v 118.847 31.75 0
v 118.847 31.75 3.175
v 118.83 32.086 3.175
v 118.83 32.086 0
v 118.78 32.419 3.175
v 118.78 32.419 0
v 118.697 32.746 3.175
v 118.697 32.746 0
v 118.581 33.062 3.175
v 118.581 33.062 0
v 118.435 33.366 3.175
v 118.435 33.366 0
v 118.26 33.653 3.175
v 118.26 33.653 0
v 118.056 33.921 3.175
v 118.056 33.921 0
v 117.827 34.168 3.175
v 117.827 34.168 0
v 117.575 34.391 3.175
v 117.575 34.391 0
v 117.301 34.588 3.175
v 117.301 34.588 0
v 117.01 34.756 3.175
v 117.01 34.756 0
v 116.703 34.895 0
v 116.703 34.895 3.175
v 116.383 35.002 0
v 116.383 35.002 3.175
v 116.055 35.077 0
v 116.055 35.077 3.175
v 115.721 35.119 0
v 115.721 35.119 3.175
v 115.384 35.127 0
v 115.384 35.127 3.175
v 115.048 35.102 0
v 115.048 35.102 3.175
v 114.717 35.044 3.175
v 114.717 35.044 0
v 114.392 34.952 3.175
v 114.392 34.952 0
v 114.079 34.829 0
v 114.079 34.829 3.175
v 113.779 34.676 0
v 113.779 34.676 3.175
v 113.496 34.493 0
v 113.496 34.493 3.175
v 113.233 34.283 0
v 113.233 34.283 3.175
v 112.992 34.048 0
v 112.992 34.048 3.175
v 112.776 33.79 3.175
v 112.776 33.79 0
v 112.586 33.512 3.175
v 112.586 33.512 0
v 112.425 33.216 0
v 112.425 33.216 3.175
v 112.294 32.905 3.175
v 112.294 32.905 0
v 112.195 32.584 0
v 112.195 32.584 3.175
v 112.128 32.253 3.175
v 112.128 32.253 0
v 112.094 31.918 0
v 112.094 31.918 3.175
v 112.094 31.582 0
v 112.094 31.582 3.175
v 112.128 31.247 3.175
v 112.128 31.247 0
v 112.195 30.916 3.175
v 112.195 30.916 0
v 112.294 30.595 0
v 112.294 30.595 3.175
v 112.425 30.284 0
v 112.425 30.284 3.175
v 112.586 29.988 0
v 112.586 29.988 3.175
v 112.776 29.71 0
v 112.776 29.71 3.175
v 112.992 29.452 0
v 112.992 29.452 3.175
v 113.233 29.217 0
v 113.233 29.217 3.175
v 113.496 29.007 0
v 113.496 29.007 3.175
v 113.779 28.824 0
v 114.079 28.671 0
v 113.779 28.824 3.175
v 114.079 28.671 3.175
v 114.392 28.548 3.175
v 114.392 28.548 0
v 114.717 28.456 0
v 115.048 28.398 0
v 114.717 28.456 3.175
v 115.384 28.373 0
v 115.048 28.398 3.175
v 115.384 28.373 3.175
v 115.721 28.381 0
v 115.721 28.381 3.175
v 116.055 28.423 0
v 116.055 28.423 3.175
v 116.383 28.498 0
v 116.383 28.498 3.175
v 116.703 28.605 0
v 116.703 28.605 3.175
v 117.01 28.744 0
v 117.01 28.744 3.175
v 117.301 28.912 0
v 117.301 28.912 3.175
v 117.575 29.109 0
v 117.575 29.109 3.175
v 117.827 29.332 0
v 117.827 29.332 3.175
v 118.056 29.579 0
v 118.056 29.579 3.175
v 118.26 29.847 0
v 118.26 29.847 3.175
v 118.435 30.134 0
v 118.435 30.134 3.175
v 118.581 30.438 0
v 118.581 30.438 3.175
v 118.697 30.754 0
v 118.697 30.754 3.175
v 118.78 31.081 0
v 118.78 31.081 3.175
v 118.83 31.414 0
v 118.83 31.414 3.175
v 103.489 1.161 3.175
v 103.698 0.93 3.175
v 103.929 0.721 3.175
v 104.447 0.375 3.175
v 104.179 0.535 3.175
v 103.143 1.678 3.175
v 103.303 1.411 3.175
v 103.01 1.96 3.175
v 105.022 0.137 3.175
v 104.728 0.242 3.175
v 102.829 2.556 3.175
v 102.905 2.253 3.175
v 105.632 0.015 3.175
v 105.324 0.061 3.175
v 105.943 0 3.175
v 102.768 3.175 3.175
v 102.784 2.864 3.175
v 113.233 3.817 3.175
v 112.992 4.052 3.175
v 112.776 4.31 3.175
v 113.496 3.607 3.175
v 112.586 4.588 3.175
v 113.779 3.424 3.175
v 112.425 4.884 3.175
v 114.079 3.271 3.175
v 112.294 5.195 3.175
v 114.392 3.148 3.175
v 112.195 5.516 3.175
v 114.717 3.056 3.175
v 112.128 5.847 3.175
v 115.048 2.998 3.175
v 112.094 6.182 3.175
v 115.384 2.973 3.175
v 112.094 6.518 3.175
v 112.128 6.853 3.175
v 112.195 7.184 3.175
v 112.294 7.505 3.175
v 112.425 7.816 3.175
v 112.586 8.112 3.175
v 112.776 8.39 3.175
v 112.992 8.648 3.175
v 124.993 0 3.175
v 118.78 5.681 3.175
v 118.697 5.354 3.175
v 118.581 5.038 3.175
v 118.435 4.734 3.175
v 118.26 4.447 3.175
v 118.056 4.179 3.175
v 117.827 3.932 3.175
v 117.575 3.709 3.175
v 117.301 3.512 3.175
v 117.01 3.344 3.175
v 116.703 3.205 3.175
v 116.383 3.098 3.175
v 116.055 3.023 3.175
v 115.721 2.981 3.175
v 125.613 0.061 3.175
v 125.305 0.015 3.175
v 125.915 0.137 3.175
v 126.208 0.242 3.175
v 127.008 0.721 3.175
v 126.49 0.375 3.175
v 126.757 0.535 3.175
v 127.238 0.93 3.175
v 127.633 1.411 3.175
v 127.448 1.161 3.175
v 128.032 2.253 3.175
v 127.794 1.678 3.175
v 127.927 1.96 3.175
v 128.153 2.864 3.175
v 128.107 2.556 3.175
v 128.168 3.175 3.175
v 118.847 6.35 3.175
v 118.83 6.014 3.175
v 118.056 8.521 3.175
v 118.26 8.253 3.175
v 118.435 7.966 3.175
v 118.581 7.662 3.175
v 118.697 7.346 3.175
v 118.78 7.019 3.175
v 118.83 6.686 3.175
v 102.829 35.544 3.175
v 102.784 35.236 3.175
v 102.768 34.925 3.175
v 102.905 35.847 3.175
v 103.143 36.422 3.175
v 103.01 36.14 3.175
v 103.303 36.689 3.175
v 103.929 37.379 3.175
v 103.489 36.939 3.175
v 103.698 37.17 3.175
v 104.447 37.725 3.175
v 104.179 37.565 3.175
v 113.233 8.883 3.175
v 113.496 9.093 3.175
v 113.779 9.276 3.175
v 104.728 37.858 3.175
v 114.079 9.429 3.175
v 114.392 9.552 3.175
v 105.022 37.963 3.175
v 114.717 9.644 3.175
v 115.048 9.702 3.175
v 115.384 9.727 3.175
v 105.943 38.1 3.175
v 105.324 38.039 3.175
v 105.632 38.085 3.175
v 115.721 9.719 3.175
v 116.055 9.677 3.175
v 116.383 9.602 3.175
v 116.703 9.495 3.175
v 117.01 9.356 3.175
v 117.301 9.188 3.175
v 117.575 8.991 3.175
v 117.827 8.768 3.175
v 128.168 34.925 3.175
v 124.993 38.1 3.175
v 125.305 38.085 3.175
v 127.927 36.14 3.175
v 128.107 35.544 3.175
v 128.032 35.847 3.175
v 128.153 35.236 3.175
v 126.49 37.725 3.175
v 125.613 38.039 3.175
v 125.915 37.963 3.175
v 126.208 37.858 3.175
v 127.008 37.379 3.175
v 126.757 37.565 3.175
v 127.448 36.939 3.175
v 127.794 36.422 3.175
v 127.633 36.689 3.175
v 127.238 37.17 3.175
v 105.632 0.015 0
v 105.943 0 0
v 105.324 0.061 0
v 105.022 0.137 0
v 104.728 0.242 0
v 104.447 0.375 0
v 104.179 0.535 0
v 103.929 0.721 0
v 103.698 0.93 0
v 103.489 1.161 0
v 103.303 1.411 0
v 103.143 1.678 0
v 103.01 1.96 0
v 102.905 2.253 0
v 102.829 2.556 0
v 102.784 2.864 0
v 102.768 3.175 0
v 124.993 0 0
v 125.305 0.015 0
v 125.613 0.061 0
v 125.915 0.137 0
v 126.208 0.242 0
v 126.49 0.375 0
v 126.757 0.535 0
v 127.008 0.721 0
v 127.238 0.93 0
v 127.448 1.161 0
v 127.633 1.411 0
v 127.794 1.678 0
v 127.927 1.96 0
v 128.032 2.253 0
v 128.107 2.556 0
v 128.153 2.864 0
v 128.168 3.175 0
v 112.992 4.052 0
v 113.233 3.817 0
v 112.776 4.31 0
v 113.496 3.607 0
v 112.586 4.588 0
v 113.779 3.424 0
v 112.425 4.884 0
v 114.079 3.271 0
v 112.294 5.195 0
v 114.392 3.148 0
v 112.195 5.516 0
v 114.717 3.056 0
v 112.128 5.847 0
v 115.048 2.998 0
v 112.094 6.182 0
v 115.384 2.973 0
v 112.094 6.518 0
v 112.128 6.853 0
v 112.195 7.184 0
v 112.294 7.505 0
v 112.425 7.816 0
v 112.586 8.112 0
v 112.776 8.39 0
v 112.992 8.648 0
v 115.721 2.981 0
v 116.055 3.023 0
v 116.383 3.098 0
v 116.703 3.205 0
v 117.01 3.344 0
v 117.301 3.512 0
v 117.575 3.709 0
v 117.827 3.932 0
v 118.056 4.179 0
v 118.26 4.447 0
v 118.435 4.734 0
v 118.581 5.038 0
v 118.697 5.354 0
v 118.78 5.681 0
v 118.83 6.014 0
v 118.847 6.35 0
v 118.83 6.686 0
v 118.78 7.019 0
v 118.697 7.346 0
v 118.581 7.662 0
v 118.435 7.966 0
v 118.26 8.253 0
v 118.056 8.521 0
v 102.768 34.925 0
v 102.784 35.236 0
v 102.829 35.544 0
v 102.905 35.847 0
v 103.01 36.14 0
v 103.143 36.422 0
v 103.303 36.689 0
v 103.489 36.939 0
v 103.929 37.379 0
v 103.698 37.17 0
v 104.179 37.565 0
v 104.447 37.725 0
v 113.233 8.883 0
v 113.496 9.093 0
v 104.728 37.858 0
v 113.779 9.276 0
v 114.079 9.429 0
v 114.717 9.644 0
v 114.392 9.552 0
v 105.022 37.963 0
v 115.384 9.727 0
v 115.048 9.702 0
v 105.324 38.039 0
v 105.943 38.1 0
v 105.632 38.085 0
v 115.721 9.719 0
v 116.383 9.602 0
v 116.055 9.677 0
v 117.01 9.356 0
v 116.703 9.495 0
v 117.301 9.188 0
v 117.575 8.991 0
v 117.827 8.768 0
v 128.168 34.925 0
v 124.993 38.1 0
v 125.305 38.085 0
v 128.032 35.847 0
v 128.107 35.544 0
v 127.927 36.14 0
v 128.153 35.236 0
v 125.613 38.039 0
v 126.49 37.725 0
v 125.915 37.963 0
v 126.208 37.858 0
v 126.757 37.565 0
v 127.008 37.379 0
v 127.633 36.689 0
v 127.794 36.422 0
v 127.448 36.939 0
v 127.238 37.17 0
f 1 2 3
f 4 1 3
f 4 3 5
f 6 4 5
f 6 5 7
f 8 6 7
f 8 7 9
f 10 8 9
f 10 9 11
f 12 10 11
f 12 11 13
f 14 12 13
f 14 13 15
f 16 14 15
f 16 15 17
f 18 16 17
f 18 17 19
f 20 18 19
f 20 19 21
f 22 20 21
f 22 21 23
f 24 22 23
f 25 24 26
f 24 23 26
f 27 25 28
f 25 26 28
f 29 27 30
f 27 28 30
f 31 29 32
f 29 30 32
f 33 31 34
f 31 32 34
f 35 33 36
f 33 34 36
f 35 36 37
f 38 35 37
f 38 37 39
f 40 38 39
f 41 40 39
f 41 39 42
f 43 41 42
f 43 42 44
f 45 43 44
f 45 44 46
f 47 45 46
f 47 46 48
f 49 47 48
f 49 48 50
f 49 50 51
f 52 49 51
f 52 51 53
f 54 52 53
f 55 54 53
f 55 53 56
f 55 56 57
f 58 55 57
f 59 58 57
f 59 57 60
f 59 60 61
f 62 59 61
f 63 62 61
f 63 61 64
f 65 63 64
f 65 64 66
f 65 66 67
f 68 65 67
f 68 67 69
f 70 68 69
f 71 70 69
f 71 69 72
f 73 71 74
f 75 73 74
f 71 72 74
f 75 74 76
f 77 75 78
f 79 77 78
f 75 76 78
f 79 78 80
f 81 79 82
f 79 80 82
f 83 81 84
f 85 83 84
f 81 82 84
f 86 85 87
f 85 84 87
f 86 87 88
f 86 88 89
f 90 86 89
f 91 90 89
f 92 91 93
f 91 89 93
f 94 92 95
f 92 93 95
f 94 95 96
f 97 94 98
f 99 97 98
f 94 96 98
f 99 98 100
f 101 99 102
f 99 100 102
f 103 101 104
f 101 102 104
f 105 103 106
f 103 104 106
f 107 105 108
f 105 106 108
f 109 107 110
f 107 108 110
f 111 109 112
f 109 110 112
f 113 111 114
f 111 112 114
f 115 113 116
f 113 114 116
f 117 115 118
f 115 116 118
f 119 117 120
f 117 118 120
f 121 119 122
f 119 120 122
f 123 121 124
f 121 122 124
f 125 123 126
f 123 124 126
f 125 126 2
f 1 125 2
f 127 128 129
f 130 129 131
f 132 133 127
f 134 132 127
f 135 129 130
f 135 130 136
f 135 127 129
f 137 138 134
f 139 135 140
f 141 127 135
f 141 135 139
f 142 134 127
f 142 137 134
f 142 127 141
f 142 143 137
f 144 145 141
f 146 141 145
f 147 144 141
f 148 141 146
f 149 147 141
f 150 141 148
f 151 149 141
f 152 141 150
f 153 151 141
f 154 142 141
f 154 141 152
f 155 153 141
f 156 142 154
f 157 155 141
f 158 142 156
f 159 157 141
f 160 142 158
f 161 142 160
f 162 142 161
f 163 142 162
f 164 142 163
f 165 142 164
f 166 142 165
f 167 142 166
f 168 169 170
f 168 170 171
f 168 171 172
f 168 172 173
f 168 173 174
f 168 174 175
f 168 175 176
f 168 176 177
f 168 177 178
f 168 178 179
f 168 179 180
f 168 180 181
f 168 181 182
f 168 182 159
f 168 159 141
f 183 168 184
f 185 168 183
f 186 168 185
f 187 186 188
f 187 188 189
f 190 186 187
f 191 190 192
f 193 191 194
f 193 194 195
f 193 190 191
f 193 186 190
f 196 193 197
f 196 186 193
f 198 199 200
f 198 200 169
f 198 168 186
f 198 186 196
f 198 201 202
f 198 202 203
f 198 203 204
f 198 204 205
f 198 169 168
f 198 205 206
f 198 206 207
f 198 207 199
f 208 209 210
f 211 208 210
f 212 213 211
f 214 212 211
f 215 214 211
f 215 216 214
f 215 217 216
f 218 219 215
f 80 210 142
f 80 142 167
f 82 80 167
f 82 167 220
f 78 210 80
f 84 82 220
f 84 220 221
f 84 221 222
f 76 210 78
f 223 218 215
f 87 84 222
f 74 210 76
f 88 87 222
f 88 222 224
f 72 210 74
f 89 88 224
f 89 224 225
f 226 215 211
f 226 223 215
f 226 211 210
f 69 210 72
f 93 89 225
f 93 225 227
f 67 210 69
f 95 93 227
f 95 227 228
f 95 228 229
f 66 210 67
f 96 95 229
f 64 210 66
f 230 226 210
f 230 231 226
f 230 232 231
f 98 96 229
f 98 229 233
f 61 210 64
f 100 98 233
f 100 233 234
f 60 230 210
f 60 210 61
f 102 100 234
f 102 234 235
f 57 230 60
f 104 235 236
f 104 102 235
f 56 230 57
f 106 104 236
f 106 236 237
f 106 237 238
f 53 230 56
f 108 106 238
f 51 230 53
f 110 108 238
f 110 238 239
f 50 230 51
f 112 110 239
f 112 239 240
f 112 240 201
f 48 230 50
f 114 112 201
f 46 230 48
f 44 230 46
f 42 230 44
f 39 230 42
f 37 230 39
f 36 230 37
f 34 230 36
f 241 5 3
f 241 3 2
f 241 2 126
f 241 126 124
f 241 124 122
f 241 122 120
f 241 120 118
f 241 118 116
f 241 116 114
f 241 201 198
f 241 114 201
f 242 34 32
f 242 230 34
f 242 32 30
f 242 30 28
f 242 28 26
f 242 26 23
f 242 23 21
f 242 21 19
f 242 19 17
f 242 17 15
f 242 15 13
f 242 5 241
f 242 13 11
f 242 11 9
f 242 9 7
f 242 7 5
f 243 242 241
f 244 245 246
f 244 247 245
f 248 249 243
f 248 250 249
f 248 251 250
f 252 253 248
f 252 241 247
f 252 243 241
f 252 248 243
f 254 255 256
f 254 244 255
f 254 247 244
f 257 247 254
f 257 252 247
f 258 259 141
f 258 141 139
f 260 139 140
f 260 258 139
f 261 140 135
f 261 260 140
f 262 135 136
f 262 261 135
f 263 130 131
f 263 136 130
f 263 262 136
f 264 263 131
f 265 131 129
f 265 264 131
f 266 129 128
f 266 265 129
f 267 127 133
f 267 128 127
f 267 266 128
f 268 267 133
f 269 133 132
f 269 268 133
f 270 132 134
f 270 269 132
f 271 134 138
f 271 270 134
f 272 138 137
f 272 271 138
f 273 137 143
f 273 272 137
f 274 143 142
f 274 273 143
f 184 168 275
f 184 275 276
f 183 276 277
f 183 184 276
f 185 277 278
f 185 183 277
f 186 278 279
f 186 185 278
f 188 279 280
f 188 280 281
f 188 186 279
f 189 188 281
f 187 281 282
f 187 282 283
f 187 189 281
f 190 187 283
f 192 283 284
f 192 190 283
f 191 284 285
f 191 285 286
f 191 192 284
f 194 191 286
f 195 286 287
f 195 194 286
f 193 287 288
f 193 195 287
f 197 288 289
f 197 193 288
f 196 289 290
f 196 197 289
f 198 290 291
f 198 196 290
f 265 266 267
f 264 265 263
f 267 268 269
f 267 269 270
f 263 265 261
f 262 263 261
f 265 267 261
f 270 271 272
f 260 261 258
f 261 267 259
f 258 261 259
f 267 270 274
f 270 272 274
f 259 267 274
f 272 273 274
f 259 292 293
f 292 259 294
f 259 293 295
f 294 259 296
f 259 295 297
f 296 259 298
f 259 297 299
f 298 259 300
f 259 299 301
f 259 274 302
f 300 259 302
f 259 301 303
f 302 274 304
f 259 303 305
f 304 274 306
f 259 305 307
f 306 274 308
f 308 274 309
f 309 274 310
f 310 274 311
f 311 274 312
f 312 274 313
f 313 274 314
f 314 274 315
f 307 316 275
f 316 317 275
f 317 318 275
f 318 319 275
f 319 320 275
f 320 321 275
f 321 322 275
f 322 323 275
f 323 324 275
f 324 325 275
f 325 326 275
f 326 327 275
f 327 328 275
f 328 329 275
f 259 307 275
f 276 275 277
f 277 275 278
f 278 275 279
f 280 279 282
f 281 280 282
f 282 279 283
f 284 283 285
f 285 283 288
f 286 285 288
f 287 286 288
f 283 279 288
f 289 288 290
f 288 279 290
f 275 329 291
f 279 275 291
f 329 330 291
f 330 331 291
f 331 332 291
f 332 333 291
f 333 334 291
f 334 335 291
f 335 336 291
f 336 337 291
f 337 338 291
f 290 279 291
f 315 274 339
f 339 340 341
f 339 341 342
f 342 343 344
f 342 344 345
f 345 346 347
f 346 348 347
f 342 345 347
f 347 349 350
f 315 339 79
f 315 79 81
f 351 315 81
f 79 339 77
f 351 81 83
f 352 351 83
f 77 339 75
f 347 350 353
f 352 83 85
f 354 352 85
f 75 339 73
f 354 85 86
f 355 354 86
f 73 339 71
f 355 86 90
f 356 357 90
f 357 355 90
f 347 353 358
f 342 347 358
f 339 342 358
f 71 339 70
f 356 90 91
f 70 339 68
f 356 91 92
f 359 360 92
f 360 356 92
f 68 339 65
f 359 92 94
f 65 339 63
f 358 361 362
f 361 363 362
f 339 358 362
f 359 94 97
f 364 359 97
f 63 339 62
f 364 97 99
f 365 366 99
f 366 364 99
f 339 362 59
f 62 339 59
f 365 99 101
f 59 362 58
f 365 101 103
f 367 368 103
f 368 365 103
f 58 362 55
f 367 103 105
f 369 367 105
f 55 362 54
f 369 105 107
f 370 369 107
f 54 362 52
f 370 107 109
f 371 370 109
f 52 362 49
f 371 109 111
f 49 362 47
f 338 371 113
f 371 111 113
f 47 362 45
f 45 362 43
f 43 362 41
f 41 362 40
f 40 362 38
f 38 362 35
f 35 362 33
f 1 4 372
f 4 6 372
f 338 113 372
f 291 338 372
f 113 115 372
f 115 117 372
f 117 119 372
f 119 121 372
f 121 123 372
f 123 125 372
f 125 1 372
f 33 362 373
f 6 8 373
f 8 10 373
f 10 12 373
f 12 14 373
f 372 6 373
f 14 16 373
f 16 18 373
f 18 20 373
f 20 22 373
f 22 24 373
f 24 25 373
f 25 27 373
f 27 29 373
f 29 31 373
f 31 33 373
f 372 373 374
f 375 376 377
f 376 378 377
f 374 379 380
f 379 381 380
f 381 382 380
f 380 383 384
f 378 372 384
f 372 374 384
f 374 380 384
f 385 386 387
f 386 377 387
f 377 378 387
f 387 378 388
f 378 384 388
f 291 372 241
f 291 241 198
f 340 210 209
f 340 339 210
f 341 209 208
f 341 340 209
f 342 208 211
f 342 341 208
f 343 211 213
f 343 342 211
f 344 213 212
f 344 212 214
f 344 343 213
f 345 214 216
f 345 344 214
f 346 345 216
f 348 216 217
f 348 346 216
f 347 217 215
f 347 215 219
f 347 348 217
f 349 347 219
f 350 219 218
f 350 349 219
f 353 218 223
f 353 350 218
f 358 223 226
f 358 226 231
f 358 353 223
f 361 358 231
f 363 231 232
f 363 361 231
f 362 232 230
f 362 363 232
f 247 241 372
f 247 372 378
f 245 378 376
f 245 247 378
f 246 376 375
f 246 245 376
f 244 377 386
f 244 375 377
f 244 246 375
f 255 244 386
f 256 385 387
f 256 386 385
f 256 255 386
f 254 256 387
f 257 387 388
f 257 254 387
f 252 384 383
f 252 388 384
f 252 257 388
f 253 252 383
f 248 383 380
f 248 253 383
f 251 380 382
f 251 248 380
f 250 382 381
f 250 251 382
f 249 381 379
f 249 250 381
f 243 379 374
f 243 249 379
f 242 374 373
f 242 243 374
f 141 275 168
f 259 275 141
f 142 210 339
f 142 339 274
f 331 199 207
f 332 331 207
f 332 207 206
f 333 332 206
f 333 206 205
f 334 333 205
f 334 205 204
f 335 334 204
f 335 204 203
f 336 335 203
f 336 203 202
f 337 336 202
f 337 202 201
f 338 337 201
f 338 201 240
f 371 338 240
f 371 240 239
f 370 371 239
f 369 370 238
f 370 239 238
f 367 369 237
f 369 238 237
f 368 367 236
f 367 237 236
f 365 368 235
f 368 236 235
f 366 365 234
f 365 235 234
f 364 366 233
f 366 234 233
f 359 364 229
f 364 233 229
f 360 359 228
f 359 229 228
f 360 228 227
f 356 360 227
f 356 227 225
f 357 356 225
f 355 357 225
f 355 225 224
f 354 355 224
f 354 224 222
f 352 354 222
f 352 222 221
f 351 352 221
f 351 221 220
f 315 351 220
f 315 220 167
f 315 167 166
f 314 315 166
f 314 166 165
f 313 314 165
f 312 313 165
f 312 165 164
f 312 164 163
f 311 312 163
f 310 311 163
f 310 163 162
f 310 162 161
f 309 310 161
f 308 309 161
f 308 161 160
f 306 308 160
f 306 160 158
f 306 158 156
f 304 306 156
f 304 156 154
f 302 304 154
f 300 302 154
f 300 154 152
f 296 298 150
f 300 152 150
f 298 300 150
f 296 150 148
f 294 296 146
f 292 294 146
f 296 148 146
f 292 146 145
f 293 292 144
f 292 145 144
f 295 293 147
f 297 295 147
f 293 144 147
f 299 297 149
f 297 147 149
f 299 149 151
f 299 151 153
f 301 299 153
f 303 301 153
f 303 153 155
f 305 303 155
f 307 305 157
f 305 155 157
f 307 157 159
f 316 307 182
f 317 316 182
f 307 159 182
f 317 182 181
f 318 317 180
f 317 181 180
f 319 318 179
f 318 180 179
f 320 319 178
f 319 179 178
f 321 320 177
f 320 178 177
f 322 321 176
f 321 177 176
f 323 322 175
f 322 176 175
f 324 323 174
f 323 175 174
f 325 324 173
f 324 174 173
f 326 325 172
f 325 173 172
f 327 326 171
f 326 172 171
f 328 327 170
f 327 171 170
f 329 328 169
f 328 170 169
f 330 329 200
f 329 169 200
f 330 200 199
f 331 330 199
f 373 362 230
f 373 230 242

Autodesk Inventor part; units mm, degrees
ref_plane "YZ Plane" through (0, 0, 0) normal (1, 0, 0) x (0, 1, 0)
ref_plane "XZ Plane" through (0, 0, 0) normal (0, 1, 0) x (-1, 0, 0)
ref_plane "XY Plane" through (0, 0, 0) normal (0, 0, 1) x (1, 0, 0)
sketch "Sketch1" plane through (0, 0, 0) normal (0, 0, 1) x (1, 0, 0)
  line L0 (0, 0) -> (0, 38.1)
  line L1 (0, 38.1) -> (128.1684, 38.1)
  line L2 (128.1684, 38.1) -> (128.1684, 0)
  line L3 (128.1684, 0) -> (0, 0)
  dimension "d0" = 38.1
  dimension "d1" = 128.1684
extrude "Extrusion1" add sketch "Sketch1" along normal blind 3.175
sketch "Sketch2" plane through (0, 0, 3.175) normal (0, 0, 1) x (1, 0, 0)
  line L0 (128.1684, 38.1) -> (0, 38.1) projected
  line L1 (0, 38.1) -> (12.7, 38.1)
  line L2 (12.7, 38.1) -> (12.7, 31.75)
  line L3 (12.7, 31.75) -> (12.7, 6.35)
  circle A0 centre (12.7, 31.75) radius 3.3782
  circle A1 centre (12.7, 6.35) radius 3.3782
  line L4 (128.1684, 38.1) -> (115.4684, 38.1)
  line L5 (115.4684, 38.1) -> (115.4684, 31.75)
  circle A2 centre (115.4684, 31.75) radius 3.3782
  circle A3 centre (115.4684, 6.35) radius 3.3782
  line L6 (115.4684, 6.35) -> (115.4684, 31.75)
  dimension "d4" = 12.7
  dimension "d5" = 6.35
  dimension "d6" = 25.4
  dimension "d7" = 6.7564
  dimension "d8" = 6.7564
  dimension "d9" = 12.7
  dimension "d10" = 6.35
  dimension "d11" = 6.7564
  dimension "d12" = 6.7564
  dimension "d13" = 25.4
extrude "Extrusion2" cut sketch "Sketch2" against normal blind 3.175
fillet "Fillet1" radius 3.175 4 edges at (128.1684, 38.1, 1.5875) (128.1684, 0, 1.5875) (0, 38.1, 1.5875) (0, 0, 1.5875)
sketch "Sketch3" plane through (0, 0, 3.175) normal (0, 0, 1) x (1, 0, 0)
  arc A0 (0, 3.175) -> (3.175, 0) centre (3.175, 3.175) ccw projected
  line L0 (3.175, 0) -> (124.9934, 0) projected
  line L1 (124.9934, 38.1) -> (3.175, 38.1) projected
  arc A1 (3.175, 38.1) -> (0, 34.925) centre (3.175, 34.925) ccw projected
  line L2 (0, 34.925) -> (0, 3.175) projected
  circle A2 centre (12.7, 31.75) radius 3.3782 projected
  circle A3 centre (12.7, 6.35) radius 3.3782 projected
  line L3 (128.1684, 38.1) -> (102.7684, 38.1)
  line L4 (102.7684, 38.1) -> (102.7684, 0)
  point P0 (0, 0)
  dimension "d17" = 25.4
extrude "Extrusion3" cut sketch "Sketch3" against normal blind 25.4
fillet "Fillet2" radius 3.175 2 edges at (102.7684, 38.1, 1.5875) (102.7684, 0, 1.5875)
properties part number "spacer plate" material "Aluminum 6061"
